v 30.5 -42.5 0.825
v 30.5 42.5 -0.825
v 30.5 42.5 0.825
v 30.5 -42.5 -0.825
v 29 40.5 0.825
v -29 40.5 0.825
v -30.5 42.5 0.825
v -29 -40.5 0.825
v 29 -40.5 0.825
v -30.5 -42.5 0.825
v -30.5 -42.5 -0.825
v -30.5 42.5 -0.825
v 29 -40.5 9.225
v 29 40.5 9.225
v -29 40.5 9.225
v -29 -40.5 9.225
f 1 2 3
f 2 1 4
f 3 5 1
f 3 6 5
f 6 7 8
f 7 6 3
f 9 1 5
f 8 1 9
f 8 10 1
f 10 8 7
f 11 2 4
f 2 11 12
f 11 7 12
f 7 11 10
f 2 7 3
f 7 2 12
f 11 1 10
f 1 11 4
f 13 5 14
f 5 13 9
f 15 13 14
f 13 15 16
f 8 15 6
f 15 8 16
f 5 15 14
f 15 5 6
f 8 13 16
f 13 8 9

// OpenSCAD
// file: ../settings.scad
// Common settings used by all scad files.

// ALL UNITS IN MILLIMETERS (MM)!!!

$fn = 30;//low-res but fast to render
//$fn = 50;//higher-res but slow to render

pi = 3.1415926535897932384626433832795;

max_footprint = 150; // 15x15 cm

bottom_clearance = 10;
bottom_clearance = 25.4/2+10;
//bottom_clearance = 30;

shell_alpha = 0.215;
//shell_alpha = 1.0;

tolerance = 0.5;

// Flat countersunk M2.5mm x 0.45mm machine screw.
screw_thread_diameter = 2.5;//2.8;//2.75;//2.4?
screw_thread_length = 5;//?
screw_head_diameter = 4.75; // M2.5
//screw_head_diameter = 5.2; // M3
screw_head_height = 1.5;//2;

screw_thread_diameter2 = 2;

unit_thickness = 5;
u = unit_thickness;

shell_thickness = unit_thickness;

// Show flags.
show_platform = 0;
show_head = 1;
show_head_shell = 0;
show_head_electronics_bb = 0;
show_battery = 1;
show_foot_cube = 0;
show_torso = 0;
show_motor = 0;
show_motor_plates = 1;
show_motor_inner_plates = 1;
show_motor_outer_plates = 1;
show_wheel = 0;//obsolete
show_tracks = 1;//
show_track_wheels = 1;
show_caster = 0;
show_rpi = 1;
show_vertical_plates = 1;//
show_horizontal_plates = 1;//
show_caster_plates = 0;//obsolete?
show_camera = 1;
show_screen = 0;
show_edge_mount = 1;
show_sonar_mount = 1;
show_recharge_mount = 1;
show_conduit = 1;
show_torso_shell = 1;
show_recharge_dock = 0;
show_head_tilt_axis = 0;
show_rpi_camera_axis = 0;
show_laser_axis = 0;

head_vertical_angle_tilt = 0;
//head_vertical_angle_tilt = 30;//max
//head_vertical_angle_tilt = 10;

torso_height = 120+20;

base_plate_diameter = max_footprint-unit_thickness*2;
base_plate_frame = 0;

head_height = 50;
head_offset_z = max_footprint/2;
head_middle_cutout = 85;

rpi_with_four_hats_and_clearance = 76;

qrd1114_w = 6.10;
qrd1114_l = 4.39;
qrd1114_h = 4.65;

dock_radius = 10;
dock_gripper_border = 2;
dock_gripper_instep = 0.9;
dock_gripper_cutout_tapper = 50;
dock_receiver_height = 5;

// Patriod Fuel+ 9000 mAh
battery_length = 90;
battery_width = 57;
battery_height = 23;
battery_offset_z = 30;//4;

wheel_diameter = 50;
wheel_offset_x = 65;
wheel_offset_z = wheel_diameter/2;
wheel_axle_diameter = 5;

//caster_diameter = 19.05; // 0.75 inches
caster_diameter = 25.45; // 1 inches
//caster_diameter = 15.875; // 5/8 inches
caster_holder_diameter = 30;//31;
caster_offset_y = base_plate_diameter/2 - caster_holder_diameter/2;

arduino_offset_x = 0;
arduino_offset_y = 0;
arduino_offset_z = 67;
arduino_offset_x2 = 0;
arduino_offset_y2 = -20;
arduino_offset_z2 = torso_height+bottom_clearance;

horizontal_plate_width = unit_thickness*8*2 - unit_thickness*2;
horizontal_plate_depth = unit_thickness*8*2;

vertical_plate_width = horizontal_plate_depth;
vertical_plate_height = unit_thickness*8;
vertical_plate_offset_x = wheel_offset_x-22.5;
vertical_plate_offset_z = vertical_plate_height/2 + unit_thickness/2;

vertical_battery_plate_height = 100 - 15;

caster_plate_width = horizontal_plate_width + unit_thickness*2;
caster_plate_mount_length = unit_thickness*4;
caster_plate_width_minor = caster_holder_diameter;

motor_switch_length = 20;
motor_switch_thickness = 6.5;
motor_switch_height = 11;
motor_switch_height_leads = 23;
motor_switch_on_height =  13.3;
motor_switch_hole_diameter = 2.5;
motor_switch_hole_offset_z = 6.5;//this plus diameter/2 is hole center from switch top
motor_switch_hole_spacing = 7.1;// holes are diameter/2 from this

motor_length = 60;
motor_width = 25;
motor_collar_width = 7;
motor_collar_height = 2.5;
motor_axle_width = 4;
motor_axle_height = 9.5;
motor_offset_x = 10;
//motor_offset_y = motor_width/2+5;
motor_offset_y = unit_thickness*3.5;
motor_offset_z = vertical_plate_height/2 - unit_thickness/2;//4;//30;
motor_mount_holes_dist = 17;
// motor countersink hole
motor_mount_holes_width = 3; // M3
motor_mount_holes_head_height = 2.2;
motor_mount_holes_head_width = 5.8;
motor_bearing_outer_diameter = 10;
motor_bearing_inner_diameter = 5.95;
motor_bearing_thickness = 2.5;

motor_unimount_idler_axle_d = screw_thread_diameter;
//motor_unimount_spacer_depth = 0.1;//too small
motor_unimount_spacer_depth = 0.5;

motor_arm_offset_y = -u*3;
motor_arm_offset_z = u*.5;

motor_plate_width = vertical_plate_width;
motor_plate_height = vertical_plate_height;
motor_plate_thickness = unit_thickness;
motor_plate_offset_z = vertical_plate_offset_z;

motor_plate_middle_thickness = 5;

wheel_hub_offset = u*3;

motor_hole_height_offset = -5;

nylon_spacer_outer_diameter = 6.35;
nylon_spacer_inner_diameter = 3.302;
nylon_spacer_length = 12.7;

track_width = unit_thickness*3;
track_offset_x = -50;
track_offset_z = .1;
//track_wheel_radius = 19;//original
track_wheel_radius = 14;
//track_wheel_hole_radius = (nylon_spacer_outer_diameter+1)/2;
track_wheel_hole_radius = motor_bearing_outer_diameter/2;

track_driver_hole_radius = (motor_axle_width)/2 + 0.1;
track_driver_set_screw_head_d = 4.1;
track_driver_set_screw_shaft_d = 2.4;
//track_wheel_width = 13.5;//original
track_wheel_width = u*2;
track_wheel_width_buffer = u*0.25;
track_offset = 3;        //distance from chassis
track_wheel_offset = track_offset;
//track_length = 250; // see tread_triangle.py, too big
//track_length = 240; // see tread_triangle.py
//track_length = 238; //inc/dec in 10 unit increments so notches match idlers
track_length = 228; //inc/dec in 10 unit increments so notches match idlers
track_radius = track_length/2/pi;
track_wheel_show_fancy = 1;
track_wheel_gap = track_wheel_width + track_wheel_width_buffer*2;
track_axle_bearing_diameter = motor_bearing_inner_diameter - 0.1;
track_tensioner_radius = 12;
track_nut_height = 3.5; //TODO
track_punchout_thickness = 0.25;//should be the same as the minimum layer thickness

head_slew_bearing_outer_diameter = 115;
head_slew_bearing_ring_thickness = 20;
head_slew_bearing_inner_diameter = head_slew_bearing_outer_diameter - head_slew_bearing_ring_thickness;
//head_slew_bearing_hole_diameter = head_slew_bearing_inner_diameter - head_slew_bearing_ring_thickness;
head_slew_bearing_hole_diameter = 12+tolerance; // slip ring https://www.adafruit.com/products/775
//head_slew_bearing_ball_diameter = 5;
head_slew_bearing_ball_diameter = 2.5; //u/2;
head_slew_bearing_height = u;//head_slew_bearing_ball_diameter*2;
head_slew_bearing_gap = 0.5;
head_slew_bearing_slew_gap = 0;
head_slew_bearing_gap_factor = 0.1;

neck_strut_width = u*7;
neck_strut_height = u*18;
neck_strut_spacing = u*8;

show_outer_race = 0;
show_inner_race_a = 1;
show_inner_race_b = 1;
show_balls = 0;
// main file
include <../settings.scad>;

module make_dfrobot_rpi_arduino_hat(){

    translate([0,0,0])
    cube([61,85,1.65], center=true);
    
    translate([0,0,8.4/2+1.65/2])
    cube([58,81,8.4], center=true);

}

make_dfrobot_rpi_arduino_hat();
